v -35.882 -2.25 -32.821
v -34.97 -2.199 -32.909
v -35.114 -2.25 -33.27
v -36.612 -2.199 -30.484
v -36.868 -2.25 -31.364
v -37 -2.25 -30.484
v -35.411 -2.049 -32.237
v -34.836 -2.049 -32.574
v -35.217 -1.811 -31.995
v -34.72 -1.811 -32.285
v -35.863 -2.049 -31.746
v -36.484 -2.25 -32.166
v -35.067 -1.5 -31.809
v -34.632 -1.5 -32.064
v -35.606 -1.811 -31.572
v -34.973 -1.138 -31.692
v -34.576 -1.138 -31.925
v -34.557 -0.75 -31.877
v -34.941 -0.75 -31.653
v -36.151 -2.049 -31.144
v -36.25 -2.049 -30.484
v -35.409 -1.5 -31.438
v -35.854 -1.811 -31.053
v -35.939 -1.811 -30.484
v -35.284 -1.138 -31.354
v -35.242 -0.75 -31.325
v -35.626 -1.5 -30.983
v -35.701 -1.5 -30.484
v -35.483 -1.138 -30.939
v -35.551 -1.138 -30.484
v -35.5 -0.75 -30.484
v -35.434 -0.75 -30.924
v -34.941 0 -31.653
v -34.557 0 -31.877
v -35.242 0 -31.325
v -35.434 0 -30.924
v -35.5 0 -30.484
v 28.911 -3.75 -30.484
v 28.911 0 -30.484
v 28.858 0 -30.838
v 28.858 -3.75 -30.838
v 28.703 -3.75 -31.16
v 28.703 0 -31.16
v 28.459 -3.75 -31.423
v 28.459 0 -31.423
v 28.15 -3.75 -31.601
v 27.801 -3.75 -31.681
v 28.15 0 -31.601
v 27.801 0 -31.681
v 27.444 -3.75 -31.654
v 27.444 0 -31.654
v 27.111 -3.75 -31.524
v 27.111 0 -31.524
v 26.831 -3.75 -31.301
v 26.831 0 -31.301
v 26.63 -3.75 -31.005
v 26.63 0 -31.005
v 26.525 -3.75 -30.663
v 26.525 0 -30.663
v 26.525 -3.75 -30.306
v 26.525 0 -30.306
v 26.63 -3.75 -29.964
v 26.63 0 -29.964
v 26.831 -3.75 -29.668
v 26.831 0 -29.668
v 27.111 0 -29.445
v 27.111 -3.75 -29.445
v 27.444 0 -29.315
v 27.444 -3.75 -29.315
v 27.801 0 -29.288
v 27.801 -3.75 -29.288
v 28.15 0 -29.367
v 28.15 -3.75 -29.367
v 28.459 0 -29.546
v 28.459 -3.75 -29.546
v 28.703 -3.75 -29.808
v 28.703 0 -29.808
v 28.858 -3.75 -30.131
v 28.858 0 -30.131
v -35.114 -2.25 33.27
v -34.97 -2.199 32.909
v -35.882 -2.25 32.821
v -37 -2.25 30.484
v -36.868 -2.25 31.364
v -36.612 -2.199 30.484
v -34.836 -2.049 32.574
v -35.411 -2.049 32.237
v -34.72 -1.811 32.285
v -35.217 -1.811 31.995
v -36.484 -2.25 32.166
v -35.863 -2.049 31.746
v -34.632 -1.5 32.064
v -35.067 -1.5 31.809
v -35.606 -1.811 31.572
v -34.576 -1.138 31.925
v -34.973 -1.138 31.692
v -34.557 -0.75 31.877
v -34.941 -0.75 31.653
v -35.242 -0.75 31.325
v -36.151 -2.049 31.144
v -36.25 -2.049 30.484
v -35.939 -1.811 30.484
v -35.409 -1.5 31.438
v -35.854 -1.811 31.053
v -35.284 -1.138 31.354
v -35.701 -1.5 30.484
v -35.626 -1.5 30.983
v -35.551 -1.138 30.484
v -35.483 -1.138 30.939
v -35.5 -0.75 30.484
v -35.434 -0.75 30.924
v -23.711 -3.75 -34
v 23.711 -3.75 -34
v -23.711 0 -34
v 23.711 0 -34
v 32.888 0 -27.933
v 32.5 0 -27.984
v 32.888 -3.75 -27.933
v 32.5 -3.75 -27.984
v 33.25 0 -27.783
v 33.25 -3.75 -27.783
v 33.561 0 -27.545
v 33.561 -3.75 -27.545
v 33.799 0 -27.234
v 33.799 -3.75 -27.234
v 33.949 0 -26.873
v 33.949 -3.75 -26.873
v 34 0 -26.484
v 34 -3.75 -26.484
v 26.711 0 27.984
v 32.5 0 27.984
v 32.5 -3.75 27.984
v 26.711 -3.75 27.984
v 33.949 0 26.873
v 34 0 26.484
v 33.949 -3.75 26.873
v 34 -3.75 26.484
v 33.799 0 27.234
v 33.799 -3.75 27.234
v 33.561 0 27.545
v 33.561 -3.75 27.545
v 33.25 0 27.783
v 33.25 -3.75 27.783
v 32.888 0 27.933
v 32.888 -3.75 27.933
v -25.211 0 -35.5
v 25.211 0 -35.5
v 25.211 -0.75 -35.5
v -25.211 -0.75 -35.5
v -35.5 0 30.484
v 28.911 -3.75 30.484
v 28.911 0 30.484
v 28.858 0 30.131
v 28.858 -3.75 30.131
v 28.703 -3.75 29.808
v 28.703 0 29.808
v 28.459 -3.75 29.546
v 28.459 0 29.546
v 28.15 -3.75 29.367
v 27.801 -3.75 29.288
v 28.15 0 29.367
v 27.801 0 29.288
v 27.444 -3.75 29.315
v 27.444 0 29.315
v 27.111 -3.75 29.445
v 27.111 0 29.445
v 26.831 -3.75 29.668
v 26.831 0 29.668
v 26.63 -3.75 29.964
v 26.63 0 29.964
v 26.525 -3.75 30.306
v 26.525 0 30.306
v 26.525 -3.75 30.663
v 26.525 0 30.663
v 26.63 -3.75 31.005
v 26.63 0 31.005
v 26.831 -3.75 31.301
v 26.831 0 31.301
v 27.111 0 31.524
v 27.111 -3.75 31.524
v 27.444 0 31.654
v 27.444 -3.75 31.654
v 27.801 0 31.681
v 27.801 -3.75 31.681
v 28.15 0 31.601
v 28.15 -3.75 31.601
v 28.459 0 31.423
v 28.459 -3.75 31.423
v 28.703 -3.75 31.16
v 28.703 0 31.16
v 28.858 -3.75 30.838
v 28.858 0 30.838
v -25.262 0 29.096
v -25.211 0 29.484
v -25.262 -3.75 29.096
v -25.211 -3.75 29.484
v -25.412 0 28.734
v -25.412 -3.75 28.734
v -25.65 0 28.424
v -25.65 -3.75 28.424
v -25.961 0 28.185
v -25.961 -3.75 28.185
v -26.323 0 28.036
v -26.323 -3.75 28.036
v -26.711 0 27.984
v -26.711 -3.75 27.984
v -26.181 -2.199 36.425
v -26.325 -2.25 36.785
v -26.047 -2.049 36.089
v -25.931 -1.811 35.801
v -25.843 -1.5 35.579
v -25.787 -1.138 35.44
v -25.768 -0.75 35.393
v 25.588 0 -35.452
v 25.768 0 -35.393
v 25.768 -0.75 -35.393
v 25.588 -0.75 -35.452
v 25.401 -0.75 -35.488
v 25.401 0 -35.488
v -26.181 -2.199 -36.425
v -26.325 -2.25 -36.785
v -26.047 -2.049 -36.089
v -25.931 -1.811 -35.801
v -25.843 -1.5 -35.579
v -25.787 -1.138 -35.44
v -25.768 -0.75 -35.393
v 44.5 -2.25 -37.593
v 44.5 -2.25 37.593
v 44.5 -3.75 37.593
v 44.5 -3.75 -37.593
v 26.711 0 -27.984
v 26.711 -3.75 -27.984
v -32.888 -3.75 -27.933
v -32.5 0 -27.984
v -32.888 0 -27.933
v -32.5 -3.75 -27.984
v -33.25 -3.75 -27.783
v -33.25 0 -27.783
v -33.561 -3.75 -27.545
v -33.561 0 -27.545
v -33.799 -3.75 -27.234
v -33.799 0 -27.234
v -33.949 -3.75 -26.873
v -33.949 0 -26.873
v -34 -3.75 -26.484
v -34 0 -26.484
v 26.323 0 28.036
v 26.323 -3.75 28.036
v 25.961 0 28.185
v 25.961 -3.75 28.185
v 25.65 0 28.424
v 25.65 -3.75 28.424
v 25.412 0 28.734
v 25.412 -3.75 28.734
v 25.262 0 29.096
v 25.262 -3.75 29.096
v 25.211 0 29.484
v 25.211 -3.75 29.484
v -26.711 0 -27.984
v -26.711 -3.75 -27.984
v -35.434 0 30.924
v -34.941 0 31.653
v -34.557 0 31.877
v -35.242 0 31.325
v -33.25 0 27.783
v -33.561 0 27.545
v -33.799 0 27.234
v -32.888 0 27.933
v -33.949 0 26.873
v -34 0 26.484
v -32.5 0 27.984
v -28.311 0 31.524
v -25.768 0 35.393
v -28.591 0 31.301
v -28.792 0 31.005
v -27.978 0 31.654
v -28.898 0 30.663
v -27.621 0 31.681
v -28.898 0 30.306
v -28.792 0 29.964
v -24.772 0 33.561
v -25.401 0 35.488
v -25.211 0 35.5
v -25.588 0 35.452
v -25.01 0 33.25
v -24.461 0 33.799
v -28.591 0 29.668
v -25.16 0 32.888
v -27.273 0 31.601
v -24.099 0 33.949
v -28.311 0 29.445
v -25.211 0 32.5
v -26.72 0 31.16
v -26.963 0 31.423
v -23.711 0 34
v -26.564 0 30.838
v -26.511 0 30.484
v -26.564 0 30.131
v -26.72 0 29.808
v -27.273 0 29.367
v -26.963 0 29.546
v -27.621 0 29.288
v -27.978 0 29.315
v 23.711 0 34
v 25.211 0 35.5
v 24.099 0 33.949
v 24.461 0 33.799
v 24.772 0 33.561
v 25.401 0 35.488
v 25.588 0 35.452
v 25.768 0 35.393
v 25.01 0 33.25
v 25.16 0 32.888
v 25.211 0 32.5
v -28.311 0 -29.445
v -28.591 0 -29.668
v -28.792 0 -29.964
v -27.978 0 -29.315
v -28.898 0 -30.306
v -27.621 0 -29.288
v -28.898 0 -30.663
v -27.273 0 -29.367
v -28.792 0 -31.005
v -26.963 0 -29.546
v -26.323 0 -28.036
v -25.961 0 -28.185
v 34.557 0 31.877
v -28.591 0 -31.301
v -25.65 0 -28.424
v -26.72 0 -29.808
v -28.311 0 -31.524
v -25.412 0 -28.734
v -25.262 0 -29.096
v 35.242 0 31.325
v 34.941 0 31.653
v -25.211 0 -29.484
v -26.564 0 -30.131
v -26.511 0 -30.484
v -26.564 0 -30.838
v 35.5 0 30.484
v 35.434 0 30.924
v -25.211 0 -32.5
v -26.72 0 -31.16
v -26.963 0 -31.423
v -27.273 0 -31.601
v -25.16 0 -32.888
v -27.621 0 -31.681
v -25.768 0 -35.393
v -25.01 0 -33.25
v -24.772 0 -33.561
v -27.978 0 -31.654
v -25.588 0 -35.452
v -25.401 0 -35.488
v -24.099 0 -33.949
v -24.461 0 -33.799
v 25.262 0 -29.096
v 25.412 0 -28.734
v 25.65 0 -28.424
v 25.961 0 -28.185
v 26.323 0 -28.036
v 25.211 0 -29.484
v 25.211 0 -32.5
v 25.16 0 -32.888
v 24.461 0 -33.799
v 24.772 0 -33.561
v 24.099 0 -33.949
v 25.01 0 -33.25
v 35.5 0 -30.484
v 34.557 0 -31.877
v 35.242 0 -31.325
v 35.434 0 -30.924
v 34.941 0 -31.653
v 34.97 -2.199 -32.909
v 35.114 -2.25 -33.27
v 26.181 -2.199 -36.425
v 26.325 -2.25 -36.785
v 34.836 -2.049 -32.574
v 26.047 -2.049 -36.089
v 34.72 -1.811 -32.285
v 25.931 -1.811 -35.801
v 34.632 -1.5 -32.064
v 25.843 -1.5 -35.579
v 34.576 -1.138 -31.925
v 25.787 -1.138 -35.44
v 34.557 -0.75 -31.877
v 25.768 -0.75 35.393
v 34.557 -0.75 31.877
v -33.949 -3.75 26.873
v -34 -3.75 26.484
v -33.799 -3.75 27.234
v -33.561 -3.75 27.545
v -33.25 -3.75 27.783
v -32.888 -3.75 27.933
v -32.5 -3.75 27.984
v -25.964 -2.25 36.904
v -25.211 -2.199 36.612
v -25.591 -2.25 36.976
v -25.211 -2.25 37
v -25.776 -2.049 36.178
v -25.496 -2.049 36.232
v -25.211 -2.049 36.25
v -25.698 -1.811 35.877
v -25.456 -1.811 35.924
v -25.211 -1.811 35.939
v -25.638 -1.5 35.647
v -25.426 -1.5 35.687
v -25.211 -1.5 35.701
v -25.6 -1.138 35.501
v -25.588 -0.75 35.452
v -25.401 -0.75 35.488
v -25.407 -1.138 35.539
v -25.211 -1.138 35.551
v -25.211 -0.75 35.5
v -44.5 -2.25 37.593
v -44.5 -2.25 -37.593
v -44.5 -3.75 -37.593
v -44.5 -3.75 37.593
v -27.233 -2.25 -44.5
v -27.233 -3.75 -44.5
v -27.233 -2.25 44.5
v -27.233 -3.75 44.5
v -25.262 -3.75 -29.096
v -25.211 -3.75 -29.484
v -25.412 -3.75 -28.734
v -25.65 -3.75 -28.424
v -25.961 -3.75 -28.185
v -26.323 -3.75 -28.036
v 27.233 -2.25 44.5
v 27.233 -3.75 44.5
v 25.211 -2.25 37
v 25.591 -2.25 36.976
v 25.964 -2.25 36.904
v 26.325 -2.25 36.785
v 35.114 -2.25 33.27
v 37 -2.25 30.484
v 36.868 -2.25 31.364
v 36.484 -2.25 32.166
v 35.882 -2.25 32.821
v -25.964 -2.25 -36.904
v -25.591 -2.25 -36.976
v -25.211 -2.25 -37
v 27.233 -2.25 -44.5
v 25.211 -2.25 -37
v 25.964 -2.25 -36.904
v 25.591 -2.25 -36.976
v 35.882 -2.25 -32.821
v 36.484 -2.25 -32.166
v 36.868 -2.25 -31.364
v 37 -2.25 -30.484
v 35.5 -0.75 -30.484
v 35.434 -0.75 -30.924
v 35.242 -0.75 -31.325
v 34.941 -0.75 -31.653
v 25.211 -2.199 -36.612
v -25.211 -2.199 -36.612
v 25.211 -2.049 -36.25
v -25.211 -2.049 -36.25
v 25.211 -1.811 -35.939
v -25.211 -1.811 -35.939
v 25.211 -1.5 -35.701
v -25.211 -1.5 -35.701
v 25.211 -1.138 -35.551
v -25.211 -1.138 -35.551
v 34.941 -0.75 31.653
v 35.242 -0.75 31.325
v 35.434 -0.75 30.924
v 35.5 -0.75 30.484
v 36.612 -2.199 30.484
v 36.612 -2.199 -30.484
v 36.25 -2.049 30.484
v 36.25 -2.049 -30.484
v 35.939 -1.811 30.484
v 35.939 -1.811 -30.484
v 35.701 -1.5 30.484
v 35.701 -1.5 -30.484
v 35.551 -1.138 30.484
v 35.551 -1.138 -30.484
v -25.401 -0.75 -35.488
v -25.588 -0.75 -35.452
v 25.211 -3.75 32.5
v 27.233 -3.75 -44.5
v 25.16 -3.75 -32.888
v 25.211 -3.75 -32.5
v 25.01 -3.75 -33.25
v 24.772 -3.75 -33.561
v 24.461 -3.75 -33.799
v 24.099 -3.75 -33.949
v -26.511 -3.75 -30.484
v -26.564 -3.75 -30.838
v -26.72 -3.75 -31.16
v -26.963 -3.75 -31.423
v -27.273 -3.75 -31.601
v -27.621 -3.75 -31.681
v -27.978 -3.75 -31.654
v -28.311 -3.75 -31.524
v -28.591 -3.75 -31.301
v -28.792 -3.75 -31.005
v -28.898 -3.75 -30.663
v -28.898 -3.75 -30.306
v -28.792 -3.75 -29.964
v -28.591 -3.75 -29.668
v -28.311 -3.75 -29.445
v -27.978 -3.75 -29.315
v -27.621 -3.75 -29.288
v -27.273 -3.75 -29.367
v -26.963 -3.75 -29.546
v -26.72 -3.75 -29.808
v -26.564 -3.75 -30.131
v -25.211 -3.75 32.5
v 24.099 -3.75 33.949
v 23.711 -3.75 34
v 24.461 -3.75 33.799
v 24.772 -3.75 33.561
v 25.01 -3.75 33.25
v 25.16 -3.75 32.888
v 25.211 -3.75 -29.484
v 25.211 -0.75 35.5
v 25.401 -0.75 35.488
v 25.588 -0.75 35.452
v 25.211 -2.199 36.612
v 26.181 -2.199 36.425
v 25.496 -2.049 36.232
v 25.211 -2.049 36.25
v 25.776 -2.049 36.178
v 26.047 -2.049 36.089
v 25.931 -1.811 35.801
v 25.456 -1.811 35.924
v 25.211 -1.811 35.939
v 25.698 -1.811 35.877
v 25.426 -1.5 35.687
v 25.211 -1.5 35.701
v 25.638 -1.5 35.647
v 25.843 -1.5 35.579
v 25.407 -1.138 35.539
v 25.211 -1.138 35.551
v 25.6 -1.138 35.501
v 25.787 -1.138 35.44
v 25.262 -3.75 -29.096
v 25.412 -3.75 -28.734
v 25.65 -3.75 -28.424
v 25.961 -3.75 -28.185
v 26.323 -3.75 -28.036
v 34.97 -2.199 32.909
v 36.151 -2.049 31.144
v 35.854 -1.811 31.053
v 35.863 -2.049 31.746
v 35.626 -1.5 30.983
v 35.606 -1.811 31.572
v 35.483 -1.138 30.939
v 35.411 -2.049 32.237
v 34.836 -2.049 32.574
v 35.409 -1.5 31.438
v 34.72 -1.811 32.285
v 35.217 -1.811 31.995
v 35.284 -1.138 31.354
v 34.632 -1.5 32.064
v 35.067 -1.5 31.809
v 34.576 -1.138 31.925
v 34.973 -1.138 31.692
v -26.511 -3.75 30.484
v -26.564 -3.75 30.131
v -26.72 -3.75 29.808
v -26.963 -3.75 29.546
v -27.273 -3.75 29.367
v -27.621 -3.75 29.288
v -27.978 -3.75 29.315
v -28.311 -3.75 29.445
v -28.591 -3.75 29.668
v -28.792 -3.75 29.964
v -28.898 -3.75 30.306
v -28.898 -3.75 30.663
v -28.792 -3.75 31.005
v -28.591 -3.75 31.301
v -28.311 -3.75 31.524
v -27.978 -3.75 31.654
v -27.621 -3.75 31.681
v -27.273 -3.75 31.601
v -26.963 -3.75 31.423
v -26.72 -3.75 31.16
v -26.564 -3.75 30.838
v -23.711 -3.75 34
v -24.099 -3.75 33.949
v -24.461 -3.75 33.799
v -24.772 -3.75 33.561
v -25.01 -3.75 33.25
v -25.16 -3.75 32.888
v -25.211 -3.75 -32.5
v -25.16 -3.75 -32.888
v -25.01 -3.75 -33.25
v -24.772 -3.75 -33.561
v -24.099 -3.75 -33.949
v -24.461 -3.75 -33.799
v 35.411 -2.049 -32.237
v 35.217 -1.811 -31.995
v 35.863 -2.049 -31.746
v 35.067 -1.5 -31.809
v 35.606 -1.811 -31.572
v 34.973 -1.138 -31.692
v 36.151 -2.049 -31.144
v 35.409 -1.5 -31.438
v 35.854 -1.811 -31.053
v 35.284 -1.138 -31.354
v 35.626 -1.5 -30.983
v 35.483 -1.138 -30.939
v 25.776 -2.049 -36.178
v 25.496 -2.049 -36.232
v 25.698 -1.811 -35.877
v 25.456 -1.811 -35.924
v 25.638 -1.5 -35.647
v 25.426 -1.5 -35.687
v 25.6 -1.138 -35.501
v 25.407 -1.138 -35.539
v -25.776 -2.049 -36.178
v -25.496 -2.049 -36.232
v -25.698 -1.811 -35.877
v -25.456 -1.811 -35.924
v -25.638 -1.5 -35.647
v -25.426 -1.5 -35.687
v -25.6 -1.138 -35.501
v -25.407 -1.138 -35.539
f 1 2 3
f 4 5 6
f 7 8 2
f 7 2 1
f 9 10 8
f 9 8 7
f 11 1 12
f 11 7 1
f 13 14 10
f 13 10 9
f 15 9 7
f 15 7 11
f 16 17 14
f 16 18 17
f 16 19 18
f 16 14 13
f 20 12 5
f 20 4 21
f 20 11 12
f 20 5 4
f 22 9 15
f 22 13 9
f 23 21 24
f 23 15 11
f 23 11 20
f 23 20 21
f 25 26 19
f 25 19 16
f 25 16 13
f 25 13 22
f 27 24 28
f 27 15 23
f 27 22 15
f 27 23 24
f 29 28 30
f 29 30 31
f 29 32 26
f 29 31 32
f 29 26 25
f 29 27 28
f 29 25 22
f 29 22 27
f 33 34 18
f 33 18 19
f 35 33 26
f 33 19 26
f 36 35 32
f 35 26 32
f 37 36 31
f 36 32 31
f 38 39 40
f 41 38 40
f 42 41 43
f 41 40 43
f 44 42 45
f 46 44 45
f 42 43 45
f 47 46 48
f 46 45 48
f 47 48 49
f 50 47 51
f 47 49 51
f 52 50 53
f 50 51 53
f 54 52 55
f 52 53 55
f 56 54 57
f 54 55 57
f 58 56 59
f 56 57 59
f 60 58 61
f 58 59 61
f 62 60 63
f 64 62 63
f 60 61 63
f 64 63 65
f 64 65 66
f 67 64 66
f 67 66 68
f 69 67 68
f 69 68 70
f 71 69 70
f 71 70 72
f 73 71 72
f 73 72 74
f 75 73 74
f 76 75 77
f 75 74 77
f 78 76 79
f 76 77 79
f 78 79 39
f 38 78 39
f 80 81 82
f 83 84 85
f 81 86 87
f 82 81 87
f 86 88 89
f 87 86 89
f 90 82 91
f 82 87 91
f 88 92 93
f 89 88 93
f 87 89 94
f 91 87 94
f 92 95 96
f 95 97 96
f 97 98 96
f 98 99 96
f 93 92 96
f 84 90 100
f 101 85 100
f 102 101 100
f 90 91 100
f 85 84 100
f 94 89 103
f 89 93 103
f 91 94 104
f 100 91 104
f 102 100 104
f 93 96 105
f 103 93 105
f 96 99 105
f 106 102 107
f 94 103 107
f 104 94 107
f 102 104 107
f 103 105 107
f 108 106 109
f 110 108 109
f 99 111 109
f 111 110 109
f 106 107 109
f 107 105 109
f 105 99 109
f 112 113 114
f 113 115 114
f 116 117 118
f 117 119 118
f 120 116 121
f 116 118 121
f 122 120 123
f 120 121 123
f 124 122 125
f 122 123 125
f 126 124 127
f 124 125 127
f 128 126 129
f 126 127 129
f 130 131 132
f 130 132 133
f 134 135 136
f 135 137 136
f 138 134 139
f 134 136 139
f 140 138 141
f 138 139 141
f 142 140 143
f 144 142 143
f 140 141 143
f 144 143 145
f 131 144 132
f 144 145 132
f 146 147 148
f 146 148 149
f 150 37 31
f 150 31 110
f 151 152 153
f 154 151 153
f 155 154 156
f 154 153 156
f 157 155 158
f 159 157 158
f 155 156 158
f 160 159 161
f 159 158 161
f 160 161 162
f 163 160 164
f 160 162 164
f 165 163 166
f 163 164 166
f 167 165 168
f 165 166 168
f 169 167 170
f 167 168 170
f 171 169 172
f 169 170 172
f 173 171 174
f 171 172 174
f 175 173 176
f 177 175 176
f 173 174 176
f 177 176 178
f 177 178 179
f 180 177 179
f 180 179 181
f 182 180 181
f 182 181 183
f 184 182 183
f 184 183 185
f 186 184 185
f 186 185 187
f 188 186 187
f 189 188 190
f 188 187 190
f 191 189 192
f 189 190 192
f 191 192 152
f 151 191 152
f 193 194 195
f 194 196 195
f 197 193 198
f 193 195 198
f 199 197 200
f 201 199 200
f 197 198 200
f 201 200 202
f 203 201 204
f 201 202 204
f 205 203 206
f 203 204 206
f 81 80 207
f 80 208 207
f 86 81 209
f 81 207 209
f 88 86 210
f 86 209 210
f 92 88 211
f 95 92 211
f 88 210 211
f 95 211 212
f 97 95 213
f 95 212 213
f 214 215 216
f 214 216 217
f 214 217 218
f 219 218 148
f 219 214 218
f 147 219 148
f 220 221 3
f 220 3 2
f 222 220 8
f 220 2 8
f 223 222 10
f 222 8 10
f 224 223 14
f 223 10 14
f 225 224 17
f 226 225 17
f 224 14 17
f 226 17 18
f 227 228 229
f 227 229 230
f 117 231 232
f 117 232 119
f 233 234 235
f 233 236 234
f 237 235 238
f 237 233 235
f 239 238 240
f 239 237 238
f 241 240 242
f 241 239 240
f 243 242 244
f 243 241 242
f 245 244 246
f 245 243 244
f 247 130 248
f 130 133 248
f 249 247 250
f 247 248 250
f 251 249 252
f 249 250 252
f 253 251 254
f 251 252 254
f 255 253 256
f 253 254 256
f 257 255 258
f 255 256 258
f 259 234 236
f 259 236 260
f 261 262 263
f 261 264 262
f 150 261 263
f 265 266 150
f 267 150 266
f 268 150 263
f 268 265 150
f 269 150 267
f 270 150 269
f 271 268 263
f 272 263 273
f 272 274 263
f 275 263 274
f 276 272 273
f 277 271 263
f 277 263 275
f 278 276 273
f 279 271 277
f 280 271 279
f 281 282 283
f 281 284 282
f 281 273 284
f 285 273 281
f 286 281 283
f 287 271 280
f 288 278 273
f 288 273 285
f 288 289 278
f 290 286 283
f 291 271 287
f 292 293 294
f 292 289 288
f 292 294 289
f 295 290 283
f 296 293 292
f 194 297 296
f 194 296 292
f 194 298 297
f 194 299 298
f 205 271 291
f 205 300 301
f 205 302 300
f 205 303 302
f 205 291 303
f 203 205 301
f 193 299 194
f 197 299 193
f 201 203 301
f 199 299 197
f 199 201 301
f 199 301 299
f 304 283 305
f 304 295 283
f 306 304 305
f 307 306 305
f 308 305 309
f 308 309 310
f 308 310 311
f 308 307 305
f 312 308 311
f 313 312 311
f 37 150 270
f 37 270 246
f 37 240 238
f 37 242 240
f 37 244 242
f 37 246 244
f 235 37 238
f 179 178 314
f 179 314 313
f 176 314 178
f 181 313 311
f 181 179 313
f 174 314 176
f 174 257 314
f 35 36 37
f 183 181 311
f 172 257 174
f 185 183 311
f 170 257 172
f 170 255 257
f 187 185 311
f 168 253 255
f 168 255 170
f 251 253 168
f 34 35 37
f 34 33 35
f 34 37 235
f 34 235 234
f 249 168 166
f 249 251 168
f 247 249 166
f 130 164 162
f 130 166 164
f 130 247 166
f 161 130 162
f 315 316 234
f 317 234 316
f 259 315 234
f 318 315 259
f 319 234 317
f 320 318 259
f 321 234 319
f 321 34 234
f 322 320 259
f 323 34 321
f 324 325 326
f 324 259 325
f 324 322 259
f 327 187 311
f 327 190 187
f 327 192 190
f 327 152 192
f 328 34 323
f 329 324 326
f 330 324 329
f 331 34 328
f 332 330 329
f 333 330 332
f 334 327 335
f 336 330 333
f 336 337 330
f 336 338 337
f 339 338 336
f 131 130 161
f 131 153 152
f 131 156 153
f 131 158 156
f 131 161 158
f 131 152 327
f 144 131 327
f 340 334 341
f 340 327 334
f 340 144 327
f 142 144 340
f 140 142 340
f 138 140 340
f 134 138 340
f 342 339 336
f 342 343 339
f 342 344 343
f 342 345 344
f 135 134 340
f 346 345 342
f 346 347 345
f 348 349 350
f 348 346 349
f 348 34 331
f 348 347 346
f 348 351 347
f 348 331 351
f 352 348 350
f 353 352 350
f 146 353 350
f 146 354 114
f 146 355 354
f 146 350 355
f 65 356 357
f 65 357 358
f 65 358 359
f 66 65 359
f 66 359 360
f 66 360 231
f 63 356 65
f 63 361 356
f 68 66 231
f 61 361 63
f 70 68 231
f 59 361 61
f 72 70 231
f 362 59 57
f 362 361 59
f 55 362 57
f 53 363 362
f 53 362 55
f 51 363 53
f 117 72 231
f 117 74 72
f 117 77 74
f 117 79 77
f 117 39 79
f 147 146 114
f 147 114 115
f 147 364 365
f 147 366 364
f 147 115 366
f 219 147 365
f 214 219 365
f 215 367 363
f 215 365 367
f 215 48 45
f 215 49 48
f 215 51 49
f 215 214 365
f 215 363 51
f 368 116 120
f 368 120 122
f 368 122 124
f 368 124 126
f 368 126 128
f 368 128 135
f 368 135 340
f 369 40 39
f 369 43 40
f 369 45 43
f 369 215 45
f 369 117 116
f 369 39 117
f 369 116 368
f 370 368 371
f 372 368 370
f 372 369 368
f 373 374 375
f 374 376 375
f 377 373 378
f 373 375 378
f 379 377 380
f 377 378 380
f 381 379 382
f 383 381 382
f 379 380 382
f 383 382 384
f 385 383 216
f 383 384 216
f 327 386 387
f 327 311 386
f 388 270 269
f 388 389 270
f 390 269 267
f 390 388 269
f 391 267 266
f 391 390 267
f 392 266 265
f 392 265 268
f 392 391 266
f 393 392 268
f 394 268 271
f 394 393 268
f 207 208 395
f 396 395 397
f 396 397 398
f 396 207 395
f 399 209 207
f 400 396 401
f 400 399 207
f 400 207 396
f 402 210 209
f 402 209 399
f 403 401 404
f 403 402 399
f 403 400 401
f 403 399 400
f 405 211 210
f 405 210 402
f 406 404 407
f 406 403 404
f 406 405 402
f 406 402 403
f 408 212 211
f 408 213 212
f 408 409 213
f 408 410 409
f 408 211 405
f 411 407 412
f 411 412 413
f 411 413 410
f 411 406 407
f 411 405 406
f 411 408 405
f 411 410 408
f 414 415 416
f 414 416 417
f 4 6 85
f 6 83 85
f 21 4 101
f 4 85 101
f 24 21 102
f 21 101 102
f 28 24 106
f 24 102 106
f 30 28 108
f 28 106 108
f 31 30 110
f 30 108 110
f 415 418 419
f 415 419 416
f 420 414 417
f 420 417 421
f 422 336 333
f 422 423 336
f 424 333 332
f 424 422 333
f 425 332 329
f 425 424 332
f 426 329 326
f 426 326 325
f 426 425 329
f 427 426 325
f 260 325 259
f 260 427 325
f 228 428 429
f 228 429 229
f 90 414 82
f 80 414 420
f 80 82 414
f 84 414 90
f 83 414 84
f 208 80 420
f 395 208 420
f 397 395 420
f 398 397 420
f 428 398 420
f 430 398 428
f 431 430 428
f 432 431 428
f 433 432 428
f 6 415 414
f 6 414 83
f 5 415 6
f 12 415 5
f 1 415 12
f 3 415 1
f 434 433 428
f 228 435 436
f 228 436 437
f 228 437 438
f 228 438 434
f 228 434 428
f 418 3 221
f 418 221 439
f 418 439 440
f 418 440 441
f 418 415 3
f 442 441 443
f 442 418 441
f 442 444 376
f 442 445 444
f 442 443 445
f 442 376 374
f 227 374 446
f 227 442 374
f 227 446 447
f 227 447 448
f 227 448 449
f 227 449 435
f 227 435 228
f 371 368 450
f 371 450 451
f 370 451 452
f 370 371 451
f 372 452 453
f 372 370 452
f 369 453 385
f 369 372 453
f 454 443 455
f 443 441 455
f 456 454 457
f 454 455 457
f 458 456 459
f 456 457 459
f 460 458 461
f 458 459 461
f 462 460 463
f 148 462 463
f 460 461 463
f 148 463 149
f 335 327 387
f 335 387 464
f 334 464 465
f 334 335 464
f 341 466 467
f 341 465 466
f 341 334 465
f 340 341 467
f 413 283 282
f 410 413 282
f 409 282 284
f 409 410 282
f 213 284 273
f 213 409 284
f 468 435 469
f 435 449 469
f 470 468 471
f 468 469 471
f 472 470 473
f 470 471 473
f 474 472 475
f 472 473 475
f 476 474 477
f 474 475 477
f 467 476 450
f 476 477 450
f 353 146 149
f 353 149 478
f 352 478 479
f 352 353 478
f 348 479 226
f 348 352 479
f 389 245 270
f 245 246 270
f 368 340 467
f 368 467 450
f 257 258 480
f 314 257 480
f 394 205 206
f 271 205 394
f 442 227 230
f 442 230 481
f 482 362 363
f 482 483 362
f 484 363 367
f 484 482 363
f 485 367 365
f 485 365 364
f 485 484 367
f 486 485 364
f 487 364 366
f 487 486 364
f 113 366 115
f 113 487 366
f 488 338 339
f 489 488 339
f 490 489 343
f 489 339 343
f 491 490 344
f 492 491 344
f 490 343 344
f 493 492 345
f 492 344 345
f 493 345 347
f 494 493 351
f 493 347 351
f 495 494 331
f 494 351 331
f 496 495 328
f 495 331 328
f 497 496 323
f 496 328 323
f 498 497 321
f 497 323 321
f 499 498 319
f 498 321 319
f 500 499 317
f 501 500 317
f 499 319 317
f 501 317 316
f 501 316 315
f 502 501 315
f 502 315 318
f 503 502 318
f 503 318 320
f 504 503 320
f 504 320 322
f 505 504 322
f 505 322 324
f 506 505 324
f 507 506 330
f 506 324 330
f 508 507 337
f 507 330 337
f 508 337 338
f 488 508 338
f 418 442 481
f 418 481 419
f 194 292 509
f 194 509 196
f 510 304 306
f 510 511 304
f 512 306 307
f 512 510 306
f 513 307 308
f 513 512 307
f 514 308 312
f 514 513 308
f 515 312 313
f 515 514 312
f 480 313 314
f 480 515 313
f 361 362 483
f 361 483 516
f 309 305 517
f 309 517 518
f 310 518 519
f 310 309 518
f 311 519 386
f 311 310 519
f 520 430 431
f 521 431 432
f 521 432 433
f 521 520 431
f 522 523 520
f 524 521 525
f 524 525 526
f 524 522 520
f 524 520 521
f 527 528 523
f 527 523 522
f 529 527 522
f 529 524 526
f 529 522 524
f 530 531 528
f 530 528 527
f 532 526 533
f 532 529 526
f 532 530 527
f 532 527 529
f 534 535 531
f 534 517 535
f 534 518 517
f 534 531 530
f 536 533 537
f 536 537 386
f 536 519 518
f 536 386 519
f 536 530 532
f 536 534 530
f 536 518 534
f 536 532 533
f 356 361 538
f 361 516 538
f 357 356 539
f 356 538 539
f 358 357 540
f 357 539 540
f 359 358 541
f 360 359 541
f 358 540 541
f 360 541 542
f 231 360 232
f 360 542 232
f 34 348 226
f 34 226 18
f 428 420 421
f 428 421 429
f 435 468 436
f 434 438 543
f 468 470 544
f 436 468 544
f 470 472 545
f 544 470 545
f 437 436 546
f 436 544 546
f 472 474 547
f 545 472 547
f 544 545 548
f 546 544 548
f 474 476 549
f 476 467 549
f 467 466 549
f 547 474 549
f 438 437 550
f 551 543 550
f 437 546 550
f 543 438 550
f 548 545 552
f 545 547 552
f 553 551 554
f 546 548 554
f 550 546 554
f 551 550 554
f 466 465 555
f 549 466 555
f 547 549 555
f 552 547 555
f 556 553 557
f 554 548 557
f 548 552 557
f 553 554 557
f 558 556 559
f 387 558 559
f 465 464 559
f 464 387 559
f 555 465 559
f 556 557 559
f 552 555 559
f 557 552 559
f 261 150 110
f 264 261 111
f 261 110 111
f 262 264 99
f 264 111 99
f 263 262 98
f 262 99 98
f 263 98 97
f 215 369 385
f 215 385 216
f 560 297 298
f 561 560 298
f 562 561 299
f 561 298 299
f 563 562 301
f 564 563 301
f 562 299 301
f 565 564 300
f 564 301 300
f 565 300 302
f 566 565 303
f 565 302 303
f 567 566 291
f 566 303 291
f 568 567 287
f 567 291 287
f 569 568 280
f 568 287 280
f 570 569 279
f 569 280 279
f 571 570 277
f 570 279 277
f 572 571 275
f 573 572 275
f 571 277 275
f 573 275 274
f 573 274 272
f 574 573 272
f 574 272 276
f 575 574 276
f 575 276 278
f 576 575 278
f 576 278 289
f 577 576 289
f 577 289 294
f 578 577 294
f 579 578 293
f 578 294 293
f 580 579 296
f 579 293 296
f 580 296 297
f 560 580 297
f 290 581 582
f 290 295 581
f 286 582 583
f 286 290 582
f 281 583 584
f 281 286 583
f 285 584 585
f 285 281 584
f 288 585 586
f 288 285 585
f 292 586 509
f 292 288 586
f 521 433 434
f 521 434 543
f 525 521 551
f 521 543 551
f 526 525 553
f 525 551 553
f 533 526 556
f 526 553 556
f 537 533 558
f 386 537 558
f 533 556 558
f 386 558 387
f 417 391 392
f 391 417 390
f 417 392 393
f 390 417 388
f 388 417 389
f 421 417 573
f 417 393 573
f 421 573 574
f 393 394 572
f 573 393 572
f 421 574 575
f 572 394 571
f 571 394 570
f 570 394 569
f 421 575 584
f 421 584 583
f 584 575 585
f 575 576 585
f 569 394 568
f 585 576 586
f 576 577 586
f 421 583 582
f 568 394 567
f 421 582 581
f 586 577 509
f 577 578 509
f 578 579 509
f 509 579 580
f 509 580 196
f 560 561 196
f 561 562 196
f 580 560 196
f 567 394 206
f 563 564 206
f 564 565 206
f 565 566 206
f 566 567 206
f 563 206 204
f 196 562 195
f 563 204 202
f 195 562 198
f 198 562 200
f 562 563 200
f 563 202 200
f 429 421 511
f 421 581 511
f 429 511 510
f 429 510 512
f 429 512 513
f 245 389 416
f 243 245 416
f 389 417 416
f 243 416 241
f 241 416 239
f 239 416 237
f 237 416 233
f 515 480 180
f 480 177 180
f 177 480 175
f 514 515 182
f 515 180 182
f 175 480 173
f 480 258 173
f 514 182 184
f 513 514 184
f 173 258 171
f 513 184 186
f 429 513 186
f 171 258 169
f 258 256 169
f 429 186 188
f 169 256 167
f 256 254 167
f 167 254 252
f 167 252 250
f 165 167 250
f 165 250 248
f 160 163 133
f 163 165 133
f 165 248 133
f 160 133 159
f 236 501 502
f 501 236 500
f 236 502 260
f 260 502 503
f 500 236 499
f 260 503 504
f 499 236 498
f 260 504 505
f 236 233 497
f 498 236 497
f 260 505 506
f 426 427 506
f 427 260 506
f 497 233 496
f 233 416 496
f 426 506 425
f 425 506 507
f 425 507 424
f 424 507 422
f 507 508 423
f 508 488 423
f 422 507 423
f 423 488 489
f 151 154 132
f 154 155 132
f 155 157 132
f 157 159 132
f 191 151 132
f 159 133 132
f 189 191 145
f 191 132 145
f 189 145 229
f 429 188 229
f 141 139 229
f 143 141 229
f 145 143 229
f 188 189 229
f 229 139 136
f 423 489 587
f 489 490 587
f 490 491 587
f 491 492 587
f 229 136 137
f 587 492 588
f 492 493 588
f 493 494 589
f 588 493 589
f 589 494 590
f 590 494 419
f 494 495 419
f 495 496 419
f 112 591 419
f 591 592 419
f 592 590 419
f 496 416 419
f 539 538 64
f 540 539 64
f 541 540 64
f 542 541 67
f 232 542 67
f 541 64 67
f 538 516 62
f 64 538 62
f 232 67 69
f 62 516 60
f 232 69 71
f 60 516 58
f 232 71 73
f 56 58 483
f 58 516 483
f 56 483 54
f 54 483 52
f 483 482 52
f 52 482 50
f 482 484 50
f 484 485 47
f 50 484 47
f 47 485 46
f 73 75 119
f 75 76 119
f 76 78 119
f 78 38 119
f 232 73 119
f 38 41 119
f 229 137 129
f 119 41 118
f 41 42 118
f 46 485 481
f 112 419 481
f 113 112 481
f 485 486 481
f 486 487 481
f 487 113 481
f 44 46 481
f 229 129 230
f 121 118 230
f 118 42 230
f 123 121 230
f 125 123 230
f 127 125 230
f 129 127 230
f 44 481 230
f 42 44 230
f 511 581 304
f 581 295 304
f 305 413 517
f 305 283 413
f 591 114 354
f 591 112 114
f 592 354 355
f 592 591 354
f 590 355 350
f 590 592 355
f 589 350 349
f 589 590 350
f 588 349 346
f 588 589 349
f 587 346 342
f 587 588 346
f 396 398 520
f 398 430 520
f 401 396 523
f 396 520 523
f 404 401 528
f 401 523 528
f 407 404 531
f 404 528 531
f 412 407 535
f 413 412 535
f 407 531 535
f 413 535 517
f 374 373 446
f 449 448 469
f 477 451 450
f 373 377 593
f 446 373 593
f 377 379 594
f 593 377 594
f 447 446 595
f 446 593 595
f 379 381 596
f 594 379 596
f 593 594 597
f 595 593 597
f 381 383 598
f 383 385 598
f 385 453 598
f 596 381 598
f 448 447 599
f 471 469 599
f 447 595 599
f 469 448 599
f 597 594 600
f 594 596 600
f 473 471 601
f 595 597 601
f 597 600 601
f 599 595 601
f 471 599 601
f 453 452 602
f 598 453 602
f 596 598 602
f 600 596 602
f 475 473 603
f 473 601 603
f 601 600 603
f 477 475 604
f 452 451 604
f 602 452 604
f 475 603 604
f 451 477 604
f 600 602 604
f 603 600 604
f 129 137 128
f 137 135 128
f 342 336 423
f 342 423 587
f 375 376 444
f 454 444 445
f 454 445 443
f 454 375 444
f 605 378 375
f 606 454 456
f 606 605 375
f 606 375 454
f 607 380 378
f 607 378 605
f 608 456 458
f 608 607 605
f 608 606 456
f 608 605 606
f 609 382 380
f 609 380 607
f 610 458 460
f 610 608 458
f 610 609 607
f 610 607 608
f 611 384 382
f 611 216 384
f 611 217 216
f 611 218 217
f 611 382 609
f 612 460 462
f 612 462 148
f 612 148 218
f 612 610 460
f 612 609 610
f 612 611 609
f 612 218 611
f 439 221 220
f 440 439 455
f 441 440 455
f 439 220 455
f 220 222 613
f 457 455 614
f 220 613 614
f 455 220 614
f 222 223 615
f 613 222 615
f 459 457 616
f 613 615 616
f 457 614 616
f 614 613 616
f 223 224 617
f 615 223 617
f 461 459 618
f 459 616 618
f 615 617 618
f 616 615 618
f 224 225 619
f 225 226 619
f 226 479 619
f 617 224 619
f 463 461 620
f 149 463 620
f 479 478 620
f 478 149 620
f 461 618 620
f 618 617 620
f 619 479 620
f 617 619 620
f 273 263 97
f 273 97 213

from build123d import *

# Parameters (mm, degrees)
BOSS_EXTRUDE1_DEPTH     = 2.25
BOSS_EXTRUDE2_DEPTH     = 1.5
CUT_EXTRUDE1_DEPTH      = 4.75
CUT_EXTRUDE1_DEPTH_BACK = 4.75
BOSS_EXTRUDE3_START     = 44.5
SKETCH5_W               = 8
SKETCH5_H               = 12.8
BOSS_EXTRUDE3_DEPTH     = 1.5
BOSS_EXTRUDE4_START     = -44.5
SKETCH5_2_W             = 8
SKETCH5_2_H             = 12.8
BOSS_EXTRUDE4_DEPTH     = 1.5
SKETCH6_R               = 1.2
CUT_EXTRUDE3_DEPTH      = 45.5
CUT_EXTRUDE3_DEPTH_BACK = 45.5
FILLET1_R               = 1.5
SKETCH7_W               = 89
SKETCH7_H               = 89
CUT_EXTRUDE4_DEPTH      = 17.55
SKETCH8_R               = 1.2
BOSS_EXTRUDE5_DEPTH     = 3.75
FILLET2_R               = 1.5


with BuildPart() as part:
    # Sketch1 → Boss-Extrude1 (new body, symmetric)
    with BuildSketch(Plane(origin=(0, 0, 0), x_dir=(1, 0, 0), z_dir=(0, 1, 0))):
        Polygon((-25.5, -35.5), (25.5, -35.5), (35.5, -31.5), (35.5, 31.5), (25.5, 35.5), (-25.5, 35.5), (-35.5, 31.5), (-35.5, -31.5), align=None)
    extrude(amount=BOSS_EXTRUDE1_DEPTH, both=True)

    # Sketch2 → Boss-Extrude2 (add)
    with BuildSketch(Plane(origin=(0, 2.25, 0), x_dir=(1, 0, 0), z_dir=(0, 1, 0))):
        Polygon((27.233241632, -44.5), (44.5, -37.593296653), (44.5, 37.593296653), (27.233241632, 44.5), (-27.233241632, 44.5), (-44.5, 37.593296653), (-44.5, -37.593296653), (-27.233241632, -44.5), align=None)
    boss_extrude2 = extrude(amount=BOSS_EXTRUDE2_DEPTH)

    # Mirror1: Boss-Extrude2 across plane
    add(boss_extrude2.mirror(Plane.ZX))

    # Sketch3 → Cut-Extrude1 (cut, two sides)
    with BuildSketch(Plane(origin=(0, 0, 0), x_dir=(1, 0, 0), z_dir=(0, 1, 0))) as cut_extrude1_sk:
        Polygon((-25.211126395, -34), (25.211126395, -34), (34, -30.484450558), (34, 30.484450558), (25.211126395, 34), (-25.211126395, 34), (-34, 30.484450558), (-34, -30.484450558), align=None)
    extrude(amount=CUT_EXTRUDE1_DEPTH, mode=Mode.SUBTRACT)
    extrude(cut_extrude1_sk.sketch, amount=-CUT_EXTRUDE1_DEPTH_BACK, mode=Mode.SUBTRACT)

    # Sketch5 → Boss-Extrude3 (add)
    with BuildSketch(Plane.XY.offset(BOSS_EXTRUDE3_START)):
        with Locations((-22, 10.15)):
            Rectangle(SKETCH5_W, SKETCH5_H)
        with Locations((22, 10.15)):
            Rectangle(SKETCH5_W, SKETCH5_H)
    extrude(amount=-BOSS_EXTRUDE3_DEPTH)

    # Sketch5<2> → Boss-Extrude4 (add)
    with BuildSketch(Plane.XY.offset(BOSS_EXTRUDE4_START)):
        with Locations((-22, 10.15)):
            Rectangle(SKETCH5_2_W, SKETCH5_2_H)
        with Locations((22, 10.15)):
            Rectangle(SKETCH5_2_W, SKETCH5_2_H)
    extrude(amount=BOSS_EXTRUDE4_DEPTH)

    # Sketch6 → Cut-Extrude3 (cut, two sides)
    with BuildSketch(Plane.XY) as cut_extrude3_sk:
        with Locations((-22, 13.85)):
            Circle(SKETCH6_R)
        with Locations((22, 13.85)):
            Circle(SKETCH6_R)
        with Locations((-22, 8.45)):
            Circle(SKETCH6_R)
        with Locations((22, 8.45)):
            Circle(SKETCH6_R)
    extrude(amount=CUT_EXTRUDE3_DEPTH, mode=Mode.SUBTRACT)
    extrude(cut_extrude3_sk.sketch, amount=-CUT_EXTRUDE3_DEPTH_BACK, mode=Mode.SUBTRACT)

    # Fillet1
    fillet1_edges = [part.edges().sort_by_distance(p)[0] for p in [
        (35.5, 0, 31.5),
        (25.5, 0, 35.5),
        (0, 2.25, -35.5),
        (0, -2.25, -35.5),
        (35.5, 2.25, 0),
        (35.5, -2.25, 0),
        (-35.5, 2.25, 0),
        (-35.5, -2.25, 0),
        (0, 2.25, 35.5),
        (0, -2.25, 35.5),
        (-25.5, 0, -35.5),
        (-30.5, 2.25, -33.5),
        (-35.5, 0, -31.5),
        (-30.5, -2.25, -33.5),
        (35.5, 0, -31.5),
        (30.5, 2.25, -33.5),
        (25.5, 0, -35.5),
        (30.5, -2.25, -33.5),
        (30.5, 2.25, 33.5),
        (30.5, -2.25, 33.5),
        (-35.5, 0, 31.5),
        (-30.5, 2.25, 33.5),
        (-25.5, 0, 35.5),
        (-30.5, -2.25, 33.5),
        (-22, 3.75, -43),
        (22, 3.75, -43),
        (-22, 3.75, 43),
        (22, 3.75, 43),
        (26, 3.75, 43.75),
        (-18, 3.75, 43.75),
        (18, 3.75, 43.75),
        (-26, 3.75, 43.75),
        (18, 3.75, -43.75),
        (26, 3.75, -43.75),
        (-26, 3.75, -43.75),
    ]]
    fillet(fillet1_edges, radius=FILLET1_R)

    # Sketch7 → Cut-Extrude4 (cut, through all)
    with BuildSketch(Plane(origin=(0, 0, 0), x_dir=(1, 0, 0), z_dir=(0, 1, 0))):
        Rectangle(SKETCH7_W, SKETCH7_H)
    extrude(amount=CUT_EXTRUDE4_DEPTH, mode=Mode.SUBTRACT)

    # Sketch8 → Boss-Extrude5 (add)
    with BuildSketch(Plane(origin=(0, 0, 0), x_dir=(1, 0, 0), z_dir=(0, 1, 0))):
        Polygon((34, 30.484450558), (25.211126395, 34), (25.211126395, 27.984450558), (34, 27.984450558), align=None)
        with Locations((27.711126395, 30.484450558)):
            Circle(SKETCH8_R, mode=Mode.SUBTRACT)
        Polygon((-25.211126395, 27.984450558), (-25.211126395, 34), (-34, 30.484450558), (-34, 27.984450558), align=None)
        with Locations((-27.711126395, 30.484450558)):
            Circle(SKETCH8_R, mode=Mode.SUBTRACT)
        Polygon((25.211126395, -27.984450558), (25.211126395, -34), (34, -30.484450558), (34, -27.984450558), align=None)
        with Locations((27.711126395, -30.484450558)):
            Circle(SKETCH8_R, mode=Mode.SUBTRACT)
        Polygon((-34, -30.484450558), (-25.211126395, -34), (-25.211126395, -27.984450558), (-34, -27.984450558), align=None)
        with Locations((-27.711126395, -30.484450558)):
            Circle(SKETCH8_R, mode=Mode.SUBTRACT)
    extrude(amount=-BOSS_EXTRUDE5_DEPTH)

    # Fillet2
    fillet2_edges = [part.edges().sort_by_distance(p)[0] for p in [
        (34, -1.875, -27.984450558),
        (25.211126395, -1.875, -27.984450558),
        (-25.211126395, -1.875, -27.984450558),
        (-34, -1.875, -27.984450558),
        (25.211126395, -1.875, 27.984450558),
        (34, -1.875, 27.984450558),
        (-34, -1.875, 27.984450558),
        (-25.211126395, -1.875, 27.984450558),
        (-25.211126395, -1.875, 34),
        (-25.211126395, -1.875, -34),
        (25.211126395, -1.875, -34),
        (25.211126395, -1.875, 34),
    ]]
    fillet(fillet2_edges, radius=FILLET2_R)


solid = part.part
